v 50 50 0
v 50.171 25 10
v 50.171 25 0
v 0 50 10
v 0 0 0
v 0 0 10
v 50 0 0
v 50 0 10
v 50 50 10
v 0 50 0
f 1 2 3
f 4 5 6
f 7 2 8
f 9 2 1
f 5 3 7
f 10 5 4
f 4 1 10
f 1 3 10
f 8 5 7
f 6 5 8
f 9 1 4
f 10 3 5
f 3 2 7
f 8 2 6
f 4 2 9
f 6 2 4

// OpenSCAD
//Almost a square.
//On one side there is a slight outer corner.
//The seam may be placed on this corner.
hull() {
	cube([50, 50, 10]);
	translate([43.1, 25, 5]) {
		rotate([0, 0, 45]) {
			cube(10, center=true);
		}
	}
}
